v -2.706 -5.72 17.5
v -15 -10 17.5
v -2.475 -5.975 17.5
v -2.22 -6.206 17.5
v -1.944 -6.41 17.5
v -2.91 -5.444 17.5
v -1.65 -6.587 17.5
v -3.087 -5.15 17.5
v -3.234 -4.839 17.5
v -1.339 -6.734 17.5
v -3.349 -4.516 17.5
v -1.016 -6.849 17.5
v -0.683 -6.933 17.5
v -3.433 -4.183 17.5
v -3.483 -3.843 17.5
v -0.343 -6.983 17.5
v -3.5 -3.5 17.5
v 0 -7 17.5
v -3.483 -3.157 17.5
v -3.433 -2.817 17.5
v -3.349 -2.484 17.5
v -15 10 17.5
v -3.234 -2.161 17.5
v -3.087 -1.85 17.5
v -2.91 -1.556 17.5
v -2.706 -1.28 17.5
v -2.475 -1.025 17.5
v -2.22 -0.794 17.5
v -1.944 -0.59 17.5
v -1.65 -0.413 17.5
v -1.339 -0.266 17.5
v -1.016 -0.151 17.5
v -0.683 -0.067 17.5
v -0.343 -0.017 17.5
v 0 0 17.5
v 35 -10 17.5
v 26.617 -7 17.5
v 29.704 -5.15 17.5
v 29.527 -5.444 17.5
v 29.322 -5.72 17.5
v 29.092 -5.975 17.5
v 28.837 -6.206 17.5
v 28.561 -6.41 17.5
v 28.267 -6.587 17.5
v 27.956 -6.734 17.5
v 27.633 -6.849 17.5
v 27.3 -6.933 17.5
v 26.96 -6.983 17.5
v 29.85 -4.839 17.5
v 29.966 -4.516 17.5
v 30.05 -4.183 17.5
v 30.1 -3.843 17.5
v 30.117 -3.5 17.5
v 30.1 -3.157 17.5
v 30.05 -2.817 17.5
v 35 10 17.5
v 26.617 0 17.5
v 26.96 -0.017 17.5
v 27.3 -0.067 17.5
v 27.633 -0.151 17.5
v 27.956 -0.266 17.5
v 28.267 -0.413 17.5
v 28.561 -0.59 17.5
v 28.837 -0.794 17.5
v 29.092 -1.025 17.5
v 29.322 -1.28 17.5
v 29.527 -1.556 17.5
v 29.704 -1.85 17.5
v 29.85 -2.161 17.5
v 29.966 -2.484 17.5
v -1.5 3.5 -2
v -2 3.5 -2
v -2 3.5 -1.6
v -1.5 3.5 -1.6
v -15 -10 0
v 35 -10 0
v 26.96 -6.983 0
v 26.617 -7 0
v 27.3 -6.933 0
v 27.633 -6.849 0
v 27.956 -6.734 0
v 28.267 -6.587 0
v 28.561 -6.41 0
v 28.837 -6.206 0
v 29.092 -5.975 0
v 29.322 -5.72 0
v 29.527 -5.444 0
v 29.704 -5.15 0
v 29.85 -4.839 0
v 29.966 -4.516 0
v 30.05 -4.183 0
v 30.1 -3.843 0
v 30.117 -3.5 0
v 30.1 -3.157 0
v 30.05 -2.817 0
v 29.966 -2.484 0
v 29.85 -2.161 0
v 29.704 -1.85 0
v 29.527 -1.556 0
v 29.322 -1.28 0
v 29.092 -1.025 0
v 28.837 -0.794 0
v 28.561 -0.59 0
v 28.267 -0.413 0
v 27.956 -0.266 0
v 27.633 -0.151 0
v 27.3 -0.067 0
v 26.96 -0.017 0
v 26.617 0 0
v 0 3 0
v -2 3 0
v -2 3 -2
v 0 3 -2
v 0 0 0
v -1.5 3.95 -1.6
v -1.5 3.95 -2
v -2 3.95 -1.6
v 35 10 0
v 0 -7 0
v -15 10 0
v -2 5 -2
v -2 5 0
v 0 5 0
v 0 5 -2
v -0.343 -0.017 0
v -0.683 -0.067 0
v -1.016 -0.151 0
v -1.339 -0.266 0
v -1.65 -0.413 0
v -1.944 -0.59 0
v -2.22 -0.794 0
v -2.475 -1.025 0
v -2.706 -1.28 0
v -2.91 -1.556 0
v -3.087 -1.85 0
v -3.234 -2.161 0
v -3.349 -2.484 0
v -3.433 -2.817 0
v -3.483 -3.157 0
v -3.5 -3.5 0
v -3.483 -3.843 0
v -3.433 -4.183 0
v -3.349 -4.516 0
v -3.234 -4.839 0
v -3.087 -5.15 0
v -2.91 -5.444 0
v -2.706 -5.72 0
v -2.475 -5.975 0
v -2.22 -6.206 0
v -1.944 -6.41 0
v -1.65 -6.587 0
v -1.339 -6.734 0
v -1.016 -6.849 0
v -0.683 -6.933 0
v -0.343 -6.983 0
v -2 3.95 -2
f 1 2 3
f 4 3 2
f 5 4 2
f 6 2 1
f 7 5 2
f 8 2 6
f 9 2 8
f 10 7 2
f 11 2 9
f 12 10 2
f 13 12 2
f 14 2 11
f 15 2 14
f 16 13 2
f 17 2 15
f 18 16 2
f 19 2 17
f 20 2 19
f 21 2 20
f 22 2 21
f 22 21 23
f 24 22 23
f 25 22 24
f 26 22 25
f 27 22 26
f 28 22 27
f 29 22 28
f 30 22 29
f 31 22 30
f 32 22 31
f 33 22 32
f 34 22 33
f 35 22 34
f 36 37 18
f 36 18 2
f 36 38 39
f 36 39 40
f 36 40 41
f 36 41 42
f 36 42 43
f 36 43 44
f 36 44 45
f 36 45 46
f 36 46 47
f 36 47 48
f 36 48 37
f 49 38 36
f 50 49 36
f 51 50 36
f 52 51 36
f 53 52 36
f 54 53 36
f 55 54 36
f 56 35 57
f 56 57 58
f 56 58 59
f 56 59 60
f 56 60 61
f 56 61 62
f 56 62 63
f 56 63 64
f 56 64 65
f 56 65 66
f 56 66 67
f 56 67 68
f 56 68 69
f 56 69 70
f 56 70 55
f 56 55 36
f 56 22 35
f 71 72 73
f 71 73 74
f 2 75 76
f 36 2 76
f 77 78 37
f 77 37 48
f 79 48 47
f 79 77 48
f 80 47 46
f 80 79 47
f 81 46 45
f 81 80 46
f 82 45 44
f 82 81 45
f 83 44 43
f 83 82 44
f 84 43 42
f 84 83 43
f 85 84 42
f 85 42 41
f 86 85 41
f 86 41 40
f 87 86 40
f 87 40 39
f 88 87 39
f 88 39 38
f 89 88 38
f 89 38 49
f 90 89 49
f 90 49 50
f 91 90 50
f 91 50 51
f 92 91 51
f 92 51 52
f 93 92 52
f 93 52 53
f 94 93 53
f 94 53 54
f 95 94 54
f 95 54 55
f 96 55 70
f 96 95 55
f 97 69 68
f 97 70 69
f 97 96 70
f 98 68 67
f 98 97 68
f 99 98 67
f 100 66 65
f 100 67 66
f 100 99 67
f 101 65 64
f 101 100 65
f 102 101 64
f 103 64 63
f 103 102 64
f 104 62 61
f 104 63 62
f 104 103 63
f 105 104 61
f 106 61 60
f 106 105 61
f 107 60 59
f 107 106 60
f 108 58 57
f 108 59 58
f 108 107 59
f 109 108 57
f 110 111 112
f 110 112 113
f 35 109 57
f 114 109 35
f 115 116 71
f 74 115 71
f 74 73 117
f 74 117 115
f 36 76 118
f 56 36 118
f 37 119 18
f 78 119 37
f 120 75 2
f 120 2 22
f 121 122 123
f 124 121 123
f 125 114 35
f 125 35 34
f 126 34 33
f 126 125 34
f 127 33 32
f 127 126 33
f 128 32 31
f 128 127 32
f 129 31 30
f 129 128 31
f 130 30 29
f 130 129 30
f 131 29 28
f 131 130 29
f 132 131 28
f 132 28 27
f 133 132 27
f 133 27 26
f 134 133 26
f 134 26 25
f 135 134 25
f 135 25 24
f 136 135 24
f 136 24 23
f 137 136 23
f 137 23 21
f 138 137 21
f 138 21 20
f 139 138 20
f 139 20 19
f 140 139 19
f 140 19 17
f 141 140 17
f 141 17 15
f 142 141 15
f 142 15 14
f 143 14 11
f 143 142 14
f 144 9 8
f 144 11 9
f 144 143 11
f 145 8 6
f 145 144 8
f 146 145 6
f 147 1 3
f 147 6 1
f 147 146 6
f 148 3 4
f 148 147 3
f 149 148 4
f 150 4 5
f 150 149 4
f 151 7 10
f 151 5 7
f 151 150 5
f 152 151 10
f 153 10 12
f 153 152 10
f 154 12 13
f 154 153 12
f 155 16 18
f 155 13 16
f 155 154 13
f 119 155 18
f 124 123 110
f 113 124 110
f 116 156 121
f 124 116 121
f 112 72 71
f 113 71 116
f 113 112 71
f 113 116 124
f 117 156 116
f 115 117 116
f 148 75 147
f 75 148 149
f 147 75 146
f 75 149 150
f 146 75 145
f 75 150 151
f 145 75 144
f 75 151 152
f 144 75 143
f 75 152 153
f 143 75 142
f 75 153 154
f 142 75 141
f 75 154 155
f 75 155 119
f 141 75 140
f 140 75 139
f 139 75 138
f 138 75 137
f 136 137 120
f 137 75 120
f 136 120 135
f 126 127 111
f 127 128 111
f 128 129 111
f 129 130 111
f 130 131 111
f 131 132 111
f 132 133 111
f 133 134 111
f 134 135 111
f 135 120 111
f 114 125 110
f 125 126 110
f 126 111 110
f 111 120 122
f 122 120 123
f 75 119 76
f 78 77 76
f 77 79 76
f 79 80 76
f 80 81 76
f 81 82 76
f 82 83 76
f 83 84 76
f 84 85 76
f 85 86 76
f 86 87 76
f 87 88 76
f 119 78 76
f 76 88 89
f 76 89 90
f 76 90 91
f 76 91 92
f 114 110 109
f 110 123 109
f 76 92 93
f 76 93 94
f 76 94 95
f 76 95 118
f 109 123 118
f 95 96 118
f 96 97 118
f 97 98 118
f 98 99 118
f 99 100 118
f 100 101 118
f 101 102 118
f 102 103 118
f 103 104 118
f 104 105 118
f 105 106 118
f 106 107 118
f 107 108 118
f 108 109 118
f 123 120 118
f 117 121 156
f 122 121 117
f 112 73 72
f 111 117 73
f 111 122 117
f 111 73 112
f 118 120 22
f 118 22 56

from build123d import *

# Parameters (mm, degrees)
F0_W     = 50
F0_H     = 20
F1_DEPTH = 17.5
F3_DEPTH = 50
F4_W     = 2
F4_H     = 2
F5_DEPTH = 2
F6_W     = 0.5
F6_H     = 0.45
F7_DEPTH = 0.4


with BuildPart() as f1:
    # F0 (on Top) → F1 (new body)
    with BuildSketch(Plane.XY):
        with Locations((10, 0)):
            Rectangle(F0_W, F0_H)
    extrude(amount=F1_DEPTH)

    # F2 (on Top) → F3 (cut)
    with BuildSketch(Plane.XY):
        with BuildLine():
            ThreePointArc((0, 0), (-3.5, -3.5), (0, -7))
            Line((0, -7), (26.61685, -7))
            ThreePointArc((26.61685, -7), (30.11685, -3.5), (26.61685, 0))
            Line((26.61685, 0), (0, 0))
        make_face()
    extrude(amount=F3_DEPTH, mode=Mode.SUBTRACT)

    # F4 (on face) → F5 (join)
    with BuildSketch(Plane(origin=(0, 0, 0), x_dir=(1, 0, 0), z_dir=(0, 0, -1))):
        with Locations((-1, -4)):
            Rectangle(F4_W, F4_H)
    extrude(amount=F5_DEPTH)

    # F6 (on face) → F7 (cut)
    with BuildSketch(Plane(origin=(0, 0, -2), x_dir=(1, 0, 0), z_dir=(0, 0, -1))):
        with Locations((-1.75, -3.725)):
            Rectangle(F6_W, F6_H)
    extrude(amount=-F7_DEPTH, mode=Mode.SUBTRACT)


solid = f1.part
